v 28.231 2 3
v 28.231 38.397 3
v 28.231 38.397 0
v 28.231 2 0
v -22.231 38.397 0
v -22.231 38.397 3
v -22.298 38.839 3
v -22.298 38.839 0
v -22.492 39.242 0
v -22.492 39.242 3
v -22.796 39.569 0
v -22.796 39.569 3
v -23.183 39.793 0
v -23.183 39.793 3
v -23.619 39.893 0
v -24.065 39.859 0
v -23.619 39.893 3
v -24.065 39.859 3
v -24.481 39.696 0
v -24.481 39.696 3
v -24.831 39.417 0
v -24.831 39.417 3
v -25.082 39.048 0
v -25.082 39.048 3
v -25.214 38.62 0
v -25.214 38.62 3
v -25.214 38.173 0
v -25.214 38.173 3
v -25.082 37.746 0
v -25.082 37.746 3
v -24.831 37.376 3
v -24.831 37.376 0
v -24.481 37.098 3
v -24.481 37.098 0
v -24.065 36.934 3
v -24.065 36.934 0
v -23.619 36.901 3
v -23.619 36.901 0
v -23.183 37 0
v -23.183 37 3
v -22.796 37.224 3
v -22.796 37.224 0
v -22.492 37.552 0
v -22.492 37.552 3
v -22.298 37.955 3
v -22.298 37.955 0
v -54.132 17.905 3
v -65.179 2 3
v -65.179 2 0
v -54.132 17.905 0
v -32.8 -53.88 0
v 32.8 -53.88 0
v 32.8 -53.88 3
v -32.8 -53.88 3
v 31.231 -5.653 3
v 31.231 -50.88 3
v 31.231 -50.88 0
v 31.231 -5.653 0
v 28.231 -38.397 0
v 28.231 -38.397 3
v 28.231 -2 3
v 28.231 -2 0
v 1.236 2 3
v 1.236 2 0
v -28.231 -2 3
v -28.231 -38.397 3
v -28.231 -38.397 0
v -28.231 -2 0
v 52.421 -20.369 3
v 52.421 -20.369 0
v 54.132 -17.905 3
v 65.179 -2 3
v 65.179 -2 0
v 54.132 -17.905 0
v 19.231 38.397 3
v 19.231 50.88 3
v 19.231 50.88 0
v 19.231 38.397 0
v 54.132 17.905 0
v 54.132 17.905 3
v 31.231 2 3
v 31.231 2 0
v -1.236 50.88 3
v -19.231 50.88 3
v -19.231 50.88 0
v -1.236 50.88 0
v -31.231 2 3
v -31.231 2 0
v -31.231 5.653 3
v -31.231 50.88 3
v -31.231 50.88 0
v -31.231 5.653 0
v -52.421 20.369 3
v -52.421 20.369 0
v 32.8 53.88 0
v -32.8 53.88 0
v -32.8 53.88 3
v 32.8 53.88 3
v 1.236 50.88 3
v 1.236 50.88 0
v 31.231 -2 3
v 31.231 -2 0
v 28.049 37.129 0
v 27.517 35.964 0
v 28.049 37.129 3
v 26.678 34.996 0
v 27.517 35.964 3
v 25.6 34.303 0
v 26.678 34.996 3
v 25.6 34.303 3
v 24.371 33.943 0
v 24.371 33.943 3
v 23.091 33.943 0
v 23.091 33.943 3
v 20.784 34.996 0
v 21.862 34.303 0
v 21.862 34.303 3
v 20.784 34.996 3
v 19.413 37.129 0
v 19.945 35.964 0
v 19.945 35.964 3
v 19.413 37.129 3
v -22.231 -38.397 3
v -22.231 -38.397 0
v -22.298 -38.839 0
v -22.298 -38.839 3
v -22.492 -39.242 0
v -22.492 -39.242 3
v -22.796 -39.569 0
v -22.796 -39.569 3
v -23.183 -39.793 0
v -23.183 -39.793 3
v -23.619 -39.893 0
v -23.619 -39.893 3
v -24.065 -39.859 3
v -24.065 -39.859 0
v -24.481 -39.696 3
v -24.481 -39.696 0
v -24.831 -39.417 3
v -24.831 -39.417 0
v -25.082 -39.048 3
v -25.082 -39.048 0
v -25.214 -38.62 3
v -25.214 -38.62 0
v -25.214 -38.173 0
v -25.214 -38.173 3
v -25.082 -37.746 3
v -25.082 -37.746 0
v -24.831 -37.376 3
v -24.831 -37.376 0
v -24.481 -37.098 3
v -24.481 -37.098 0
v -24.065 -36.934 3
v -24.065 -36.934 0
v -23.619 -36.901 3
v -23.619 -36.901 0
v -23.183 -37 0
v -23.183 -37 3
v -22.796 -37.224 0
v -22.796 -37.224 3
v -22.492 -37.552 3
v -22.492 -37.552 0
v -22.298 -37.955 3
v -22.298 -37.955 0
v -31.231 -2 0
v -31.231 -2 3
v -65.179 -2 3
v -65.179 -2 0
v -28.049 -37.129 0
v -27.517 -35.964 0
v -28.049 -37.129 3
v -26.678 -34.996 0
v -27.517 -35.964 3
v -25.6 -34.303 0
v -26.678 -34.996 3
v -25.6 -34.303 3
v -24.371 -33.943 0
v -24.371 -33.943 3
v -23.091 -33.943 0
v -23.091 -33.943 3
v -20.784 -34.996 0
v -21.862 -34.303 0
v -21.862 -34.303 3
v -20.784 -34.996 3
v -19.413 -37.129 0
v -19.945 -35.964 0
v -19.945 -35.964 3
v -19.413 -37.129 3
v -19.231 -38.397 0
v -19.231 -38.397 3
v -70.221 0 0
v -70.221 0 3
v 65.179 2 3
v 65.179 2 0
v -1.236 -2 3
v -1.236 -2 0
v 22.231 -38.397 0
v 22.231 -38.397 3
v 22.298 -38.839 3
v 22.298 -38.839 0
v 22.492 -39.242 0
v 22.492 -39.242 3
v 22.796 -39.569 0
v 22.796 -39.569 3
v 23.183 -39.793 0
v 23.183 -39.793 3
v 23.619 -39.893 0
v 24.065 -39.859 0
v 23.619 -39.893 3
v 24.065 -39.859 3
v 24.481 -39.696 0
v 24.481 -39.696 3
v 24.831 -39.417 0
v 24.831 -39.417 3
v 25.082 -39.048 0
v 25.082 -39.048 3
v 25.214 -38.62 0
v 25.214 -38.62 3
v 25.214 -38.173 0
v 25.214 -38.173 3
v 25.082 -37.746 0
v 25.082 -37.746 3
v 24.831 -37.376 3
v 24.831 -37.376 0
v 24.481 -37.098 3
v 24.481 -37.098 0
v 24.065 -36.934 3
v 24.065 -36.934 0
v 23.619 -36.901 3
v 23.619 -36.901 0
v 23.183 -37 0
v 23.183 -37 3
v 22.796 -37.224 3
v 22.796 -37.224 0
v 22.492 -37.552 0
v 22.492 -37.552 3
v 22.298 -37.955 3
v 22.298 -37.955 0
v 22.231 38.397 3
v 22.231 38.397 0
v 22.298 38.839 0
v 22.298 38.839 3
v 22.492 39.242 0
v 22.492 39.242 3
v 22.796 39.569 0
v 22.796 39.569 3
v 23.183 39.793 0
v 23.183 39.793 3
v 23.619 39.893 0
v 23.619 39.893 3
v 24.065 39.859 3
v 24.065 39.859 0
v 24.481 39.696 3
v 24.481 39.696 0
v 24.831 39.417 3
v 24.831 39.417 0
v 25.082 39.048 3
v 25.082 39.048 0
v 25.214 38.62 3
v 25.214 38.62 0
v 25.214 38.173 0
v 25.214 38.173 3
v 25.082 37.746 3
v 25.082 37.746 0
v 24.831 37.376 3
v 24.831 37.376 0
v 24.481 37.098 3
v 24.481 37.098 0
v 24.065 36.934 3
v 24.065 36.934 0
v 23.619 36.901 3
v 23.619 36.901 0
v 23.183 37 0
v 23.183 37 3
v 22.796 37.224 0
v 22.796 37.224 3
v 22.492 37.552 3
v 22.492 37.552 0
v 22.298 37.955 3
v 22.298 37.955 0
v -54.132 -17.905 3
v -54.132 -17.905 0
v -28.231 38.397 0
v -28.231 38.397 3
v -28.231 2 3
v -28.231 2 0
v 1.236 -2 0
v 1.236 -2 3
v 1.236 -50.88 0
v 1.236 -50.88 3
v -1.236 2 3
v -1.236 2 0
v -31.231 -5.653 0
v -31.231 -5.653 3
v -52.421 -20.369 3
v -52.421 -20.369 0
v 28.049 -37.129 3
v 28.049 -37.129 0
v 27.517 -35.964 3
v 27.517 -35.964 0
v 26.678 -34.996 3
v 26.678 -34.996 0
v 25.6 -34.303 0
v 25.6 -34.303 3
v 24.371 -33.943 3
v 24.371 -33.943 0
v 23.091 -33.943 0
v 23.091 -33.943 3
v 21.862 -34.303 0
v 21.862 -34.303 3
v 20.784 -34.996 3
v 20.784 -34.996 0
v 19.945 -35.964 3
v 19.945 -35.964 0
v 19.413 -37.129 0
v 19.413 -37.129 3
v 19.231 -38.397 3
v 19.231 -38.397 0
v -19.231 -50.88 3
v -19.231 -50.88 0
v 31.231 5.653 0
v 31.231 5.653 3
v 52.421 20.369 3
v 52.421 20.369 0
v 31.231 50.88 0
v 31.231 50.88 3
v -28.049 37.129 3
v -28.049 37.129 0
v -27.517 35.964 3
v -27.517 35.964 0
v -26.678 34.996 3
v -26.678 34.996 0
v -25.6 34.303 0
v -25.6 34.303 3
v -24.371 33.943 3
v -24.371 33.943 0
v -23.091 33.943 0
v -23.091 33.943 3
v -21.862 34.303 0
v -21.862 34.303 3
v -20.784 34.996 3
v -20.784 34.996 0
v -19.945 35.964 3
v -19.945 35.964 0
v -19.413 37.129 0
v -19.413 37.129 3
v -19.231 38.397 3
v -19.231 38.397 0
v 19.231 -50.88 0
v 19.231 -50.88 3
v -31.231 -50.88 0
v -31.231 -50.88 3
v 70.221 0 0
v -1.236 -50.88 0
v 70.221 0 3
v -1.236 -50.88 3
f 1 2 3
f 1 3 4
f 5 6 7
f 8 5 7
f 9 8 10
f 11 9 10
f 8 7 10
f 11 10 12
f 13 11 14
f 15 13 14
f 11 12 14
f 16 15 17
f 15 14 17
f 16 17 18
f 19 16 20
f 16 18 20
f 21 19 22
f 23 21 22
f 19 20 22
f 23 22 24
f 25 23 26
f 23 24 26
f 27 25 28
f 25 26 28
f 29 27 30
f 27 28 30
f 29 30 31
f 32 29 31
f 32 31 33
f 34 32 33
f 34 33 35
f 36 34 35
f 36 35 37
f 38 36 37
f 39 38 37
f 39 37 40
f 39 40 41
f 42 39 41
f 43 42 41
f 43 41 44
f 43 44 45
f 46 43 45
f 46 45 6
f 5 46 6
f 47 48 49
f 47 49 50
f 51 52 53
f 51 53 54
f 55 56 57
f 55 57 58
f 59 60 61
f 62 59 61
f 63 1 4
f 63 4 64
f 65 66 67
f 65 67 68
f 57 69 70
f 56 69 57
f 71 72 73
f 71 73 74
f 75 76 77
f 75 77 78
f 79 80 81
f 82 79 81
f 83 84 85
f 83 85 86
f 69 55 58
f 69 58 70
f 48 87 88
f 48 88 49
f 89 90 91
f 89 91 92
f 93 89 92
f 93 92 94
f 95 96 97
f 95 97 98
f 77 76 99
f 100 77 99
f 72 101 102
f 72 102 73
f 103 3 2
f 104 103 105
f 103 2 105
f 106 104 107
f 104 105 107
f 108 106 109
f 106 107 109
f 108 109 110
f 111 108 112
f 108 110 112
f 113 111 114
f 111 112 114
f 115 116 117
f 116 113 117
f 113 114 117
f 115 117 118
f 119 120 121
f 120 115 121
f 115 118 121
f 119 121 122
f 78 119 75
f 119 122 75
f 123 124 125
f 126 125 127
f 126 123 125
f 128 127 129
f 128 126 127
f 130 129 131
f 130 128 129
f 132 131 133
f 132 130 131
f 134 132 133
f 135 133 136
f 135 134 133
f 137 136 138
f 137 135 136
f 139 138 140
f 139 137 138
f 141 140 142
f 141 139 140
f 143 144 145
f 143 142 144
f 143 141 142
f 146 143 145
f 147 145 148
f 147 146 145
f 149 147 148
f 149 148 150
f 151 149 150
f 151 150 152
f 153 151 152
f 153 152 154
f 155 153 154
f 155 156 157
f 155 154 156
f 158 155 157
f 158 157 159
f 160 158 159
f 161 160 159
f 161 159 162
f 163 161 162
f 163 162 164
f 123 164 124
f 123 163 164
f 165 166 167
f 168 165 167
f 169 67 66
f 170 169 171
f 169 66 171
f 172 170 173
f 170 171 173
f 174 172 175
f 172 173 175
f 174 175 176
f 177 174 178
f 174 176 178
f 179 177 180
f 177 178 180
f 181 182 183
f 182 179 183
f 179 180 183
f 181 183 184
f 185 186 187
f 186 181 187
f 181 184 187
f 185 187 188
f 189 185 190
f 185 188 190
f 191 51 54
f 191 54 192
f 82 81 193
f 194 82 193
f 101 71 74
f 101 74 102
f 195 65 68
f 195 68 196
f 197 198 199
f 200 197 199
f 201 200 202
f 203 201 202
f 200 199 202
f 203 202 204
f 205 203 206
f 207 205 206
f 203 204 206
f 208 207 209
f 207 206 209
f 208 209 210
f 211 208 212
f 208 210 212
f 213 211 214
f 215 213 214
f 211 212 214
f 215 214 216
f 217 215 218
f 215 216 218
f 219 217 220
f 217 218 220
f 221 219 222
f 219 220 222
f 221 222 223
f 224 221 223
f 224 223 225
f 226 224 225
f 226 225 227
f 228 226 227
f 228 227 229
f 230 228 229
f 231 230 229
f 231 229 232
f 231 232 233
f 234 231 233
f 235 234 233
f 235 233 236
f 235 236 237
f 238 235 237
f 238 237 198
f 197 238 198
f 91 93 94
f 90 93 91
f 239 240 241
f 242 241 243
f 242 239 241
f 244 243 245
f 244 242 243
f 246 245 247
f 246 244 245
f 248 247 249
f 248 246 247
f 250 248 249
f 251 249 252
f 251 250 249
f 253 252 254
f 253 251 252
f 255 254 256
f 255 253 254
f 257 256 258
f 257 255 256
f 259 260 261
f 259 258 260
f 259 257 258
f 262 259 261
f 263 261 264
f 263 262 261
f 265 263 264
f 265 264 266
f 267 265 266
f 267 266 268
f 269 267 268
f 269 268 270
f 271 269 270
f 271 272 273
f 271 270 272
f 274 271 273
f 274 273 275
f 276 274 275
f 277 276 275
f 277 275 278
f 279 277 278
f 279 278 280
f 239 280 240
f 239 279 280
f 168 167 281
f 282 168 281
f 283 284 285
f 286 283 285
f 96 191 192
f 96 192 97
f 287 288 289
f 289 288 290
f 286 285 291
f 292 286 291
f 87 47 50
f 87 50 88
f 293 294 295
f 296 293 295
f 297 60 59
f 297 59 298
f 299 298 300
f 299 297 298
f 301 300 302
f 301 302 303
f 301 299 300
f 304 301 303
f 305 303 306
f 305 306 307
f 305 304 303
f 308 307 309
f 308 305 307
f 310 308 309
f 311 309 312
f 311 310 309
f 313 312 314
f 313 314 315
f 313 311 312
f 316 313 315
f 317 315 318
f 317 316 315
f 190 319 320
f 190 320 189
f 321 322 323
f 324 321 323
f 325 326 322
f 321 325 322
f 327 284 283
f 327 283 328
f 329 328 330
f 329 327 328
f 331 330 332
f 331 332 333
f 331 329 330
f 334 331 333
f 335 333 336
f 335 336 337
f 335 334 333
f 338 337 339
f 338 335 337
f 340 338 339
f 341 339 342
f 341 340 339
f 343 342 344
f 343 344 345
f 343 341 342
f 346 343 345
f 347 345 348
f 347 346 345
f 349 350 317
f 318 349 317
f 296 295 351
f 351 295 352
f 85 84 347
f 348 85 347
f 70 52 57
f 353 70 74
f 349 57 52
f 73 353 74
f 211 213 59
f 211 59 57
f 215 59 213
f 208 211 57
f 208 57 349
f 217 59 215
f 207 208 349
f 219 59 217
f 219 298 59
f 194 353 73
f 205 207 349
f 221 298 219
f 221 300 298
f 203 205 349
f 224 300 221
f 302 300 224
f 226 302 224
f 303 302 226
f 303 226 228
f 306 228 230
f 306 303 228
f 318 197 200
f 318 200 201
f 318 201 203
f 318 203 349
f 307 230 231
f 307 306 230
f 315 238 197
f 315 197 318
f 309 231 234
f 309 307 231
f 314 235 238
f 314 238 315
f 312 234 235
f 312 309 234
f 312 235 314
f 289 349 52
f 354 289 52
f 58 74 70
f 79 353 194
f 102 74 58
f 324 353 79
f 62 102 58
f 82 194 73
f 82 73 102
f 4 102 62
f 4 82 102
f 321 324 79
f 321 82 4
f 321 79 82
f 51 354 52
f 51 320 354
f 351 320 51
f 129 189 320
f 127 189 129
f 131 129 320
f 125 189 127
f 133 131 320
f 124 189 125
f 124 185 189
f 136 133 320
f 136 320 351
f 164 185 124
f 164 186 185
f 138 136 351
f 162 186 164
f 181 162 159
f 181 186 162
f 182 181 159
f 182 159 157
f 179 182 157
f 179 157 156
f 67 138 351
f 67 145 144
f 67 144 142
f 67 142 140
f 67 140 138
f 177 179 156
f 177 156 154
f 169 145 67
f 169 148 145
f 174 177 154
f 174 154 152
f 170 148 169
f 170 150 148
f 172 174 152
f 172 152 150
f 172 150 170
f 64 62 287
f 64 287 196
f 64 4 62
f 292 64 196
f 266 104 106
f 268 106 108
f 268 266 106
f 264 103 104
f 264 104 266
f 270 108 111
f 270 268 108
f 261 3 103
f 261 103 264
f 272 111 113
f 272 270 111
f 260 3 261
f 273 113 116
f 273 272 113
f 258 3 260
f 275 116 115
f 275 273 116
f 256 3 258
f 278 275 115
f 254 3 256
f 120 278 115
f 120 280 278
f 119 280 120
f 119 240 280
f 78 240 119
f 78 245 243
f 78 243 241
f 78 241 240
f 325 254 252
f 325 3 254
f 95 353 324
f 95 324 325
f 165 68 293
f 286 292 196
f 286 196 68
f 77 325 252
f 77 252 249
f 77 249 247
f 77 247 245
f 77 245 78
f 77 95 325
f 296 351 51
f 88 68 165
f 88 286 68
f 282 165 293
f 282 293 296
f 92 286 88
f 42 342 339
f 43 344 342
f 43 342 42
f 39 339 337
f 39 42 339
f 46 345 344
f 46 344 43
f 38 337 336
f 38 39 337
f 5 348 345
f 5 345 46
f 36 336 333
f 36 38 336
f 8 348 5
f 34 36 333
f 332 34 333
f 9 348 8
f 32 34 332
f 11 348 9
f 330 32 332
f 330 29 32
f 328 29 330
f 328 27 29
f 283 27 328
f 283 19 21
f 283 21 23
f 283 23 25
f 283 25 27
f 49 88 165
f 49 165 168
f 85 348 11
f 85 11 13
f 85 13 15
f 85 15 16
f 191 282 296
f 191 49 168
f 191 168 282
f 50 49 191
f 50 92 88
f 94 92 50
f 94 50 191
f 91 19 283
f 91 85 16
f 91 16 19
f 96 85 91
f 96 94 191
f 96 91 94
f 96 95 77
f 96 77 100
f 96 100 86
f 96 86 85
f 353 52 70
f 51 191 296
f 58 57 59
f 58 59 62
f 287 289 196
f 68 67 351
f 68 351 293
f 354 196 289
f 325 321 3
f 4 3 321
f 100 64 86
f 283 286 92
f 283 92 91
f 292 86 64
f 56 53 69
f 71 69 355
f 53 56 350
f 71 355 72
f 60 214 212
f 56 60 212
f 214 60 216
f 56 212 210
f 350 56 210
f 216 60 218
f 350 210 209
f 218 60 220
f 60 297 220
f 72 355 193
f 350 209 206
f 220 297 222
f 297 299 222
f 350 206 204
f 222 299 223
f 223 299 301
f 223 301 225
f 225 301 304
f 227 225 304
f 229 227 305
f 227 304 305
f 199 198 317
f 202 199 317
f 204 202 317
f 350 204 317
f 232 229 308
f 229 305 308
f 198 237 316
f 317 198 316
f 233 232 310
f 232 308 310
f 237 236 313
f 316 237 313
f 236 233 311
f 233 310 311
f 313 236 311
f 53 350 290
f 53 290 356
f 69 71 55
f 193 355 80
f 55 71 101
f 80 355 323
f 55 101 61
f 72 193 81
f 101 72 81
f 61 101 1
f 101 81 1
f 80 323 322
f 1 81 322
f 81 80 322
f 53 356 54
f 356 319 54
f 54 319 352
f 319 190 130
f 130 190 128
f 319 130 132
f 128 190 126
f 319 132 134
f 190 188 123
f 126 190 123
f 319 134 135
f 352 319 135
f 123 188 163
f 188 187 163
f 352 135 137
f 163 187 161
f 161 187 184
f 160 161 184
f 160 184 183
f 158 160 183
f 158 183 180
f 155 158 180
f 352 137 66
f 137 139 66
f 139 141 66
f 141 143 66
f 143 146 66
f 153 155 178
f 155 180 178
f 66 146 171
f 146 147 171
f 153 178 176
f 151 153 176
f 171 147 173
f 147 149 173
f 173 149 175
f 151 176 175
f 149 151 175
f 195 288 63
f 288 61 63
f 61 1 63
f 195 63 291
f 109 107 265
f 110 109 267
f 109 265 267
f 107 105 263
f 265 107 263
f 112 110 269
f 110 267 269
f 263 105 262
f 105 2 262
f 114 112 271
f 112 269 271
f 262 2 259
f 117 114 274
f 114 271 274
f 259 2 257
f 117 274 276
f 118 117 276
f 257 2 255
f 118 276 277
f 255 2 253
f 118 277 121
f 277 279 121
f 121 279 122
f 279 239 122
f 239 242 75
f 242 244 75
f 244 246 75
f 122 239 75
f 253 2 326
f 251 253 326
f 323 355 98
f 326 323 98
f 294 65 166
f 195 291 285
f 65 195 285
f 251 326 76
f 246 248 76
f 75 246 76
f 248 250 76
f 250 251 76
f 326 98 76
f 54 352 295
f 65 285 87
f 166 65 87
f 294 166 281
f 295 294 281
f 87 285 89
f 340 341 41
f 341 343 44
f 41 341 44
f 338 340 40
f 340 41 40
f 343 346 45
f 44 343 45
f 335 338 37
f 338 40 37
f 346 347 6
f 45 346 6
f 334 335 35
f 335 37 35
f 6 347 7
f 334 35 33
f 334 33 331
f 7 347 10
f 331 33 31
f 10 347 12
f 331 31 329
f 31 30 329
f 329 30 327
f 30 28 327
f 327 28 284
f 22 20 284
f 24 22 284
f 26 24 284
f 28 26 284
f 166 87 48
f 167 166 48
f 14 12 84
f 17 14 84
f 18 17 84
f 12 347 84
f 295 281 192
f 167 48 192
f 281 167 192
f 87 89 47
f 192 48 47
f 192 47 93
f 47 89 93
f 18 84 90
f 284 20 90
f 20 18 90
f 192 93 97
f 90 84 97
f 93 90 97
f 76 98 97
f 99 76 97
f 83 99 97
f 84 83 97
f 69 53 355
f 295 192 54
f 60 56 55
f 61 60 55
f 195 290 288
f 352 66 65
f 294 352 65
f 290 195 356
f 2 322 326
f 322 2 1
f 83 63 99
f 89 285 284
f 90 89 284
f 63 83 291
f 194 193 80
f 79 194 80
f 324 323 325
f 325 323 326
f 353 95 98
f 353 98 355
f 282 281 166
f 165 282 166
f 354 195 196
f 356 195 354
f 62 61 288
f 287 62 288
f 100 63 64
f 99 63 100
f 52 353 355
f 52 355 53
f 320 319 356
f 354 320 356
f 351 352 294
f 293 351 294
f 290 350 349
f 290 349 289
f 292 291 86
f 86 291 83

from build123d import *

# Parameters (mm, degrees)
SKETCH001_R      = 1.5
EXTRUDE001_DEPTH = 10
EXTRUDE_DEPTH    = 3


with BuildPart() as extrude001:
    # Sketch001 (on Face8 of Extrude) → Extrude001 (new body)
    with BuildSketch(Plane.XY.offset(3)):
        with Locations((-23.730994, 38.396749)):
            Circle(SKETCH001_R)
        Polygon((-65.179059, 2), (-54.13242, 17.905464), (-31.230994, 2), align=None)
        Polygon((-31.230994, 5.652561), (-52.421109, 20.369488), (-31.230994, 50.88), align=None)
        with BuildLine():
            Line((-28.230994, 38.396749), (-28.230994, 2))
            Line((-28.230994, 2), (-1.236094, 2))
            Line((-1.236094, 2), (-1.236094, 50.88))
            Line((-19.230994, 50.88), (-1.236094, 50.88))
            Line((-19.230994, 50.88), (-19.230994, 38.396747))
            ThreePointArc((-28.230994, 38.396749), (-23.730995, 33.896749), (-19.230994, 38.396747))
        make_face()
    extrude(amount=-EXTRUDE001_DEPTH)


with BuildPart() as part_mirroring:
    # Part__Mirroring: instance of Extrude001
    add(extrude001.part.mirror(Plane(origin=(0, 0, 0), x_dir=(1, 0, 0), z_dir=(0, 1, 0))))


with BuildPart() as part_mirroring001:
    # Part__Mirroring001: instance of Part__Mirroring
    add(part_mirroring.part.mirror(Plane(origin=(0, 0, 0), x_dir=(0, -1, 0), z_dir=(1, 0, 0))))


with BuildPart() as part_mirroring002:
    # Part__Mirroring002: instance of Extrude001
    add(extrude001.part.mirror(Plane(origin=(0, 0, 0), x_dir=(0, -1, 0), z_dir=(1, 0, 0))))


with BuildPart() as cut003:
    # Sketch → Extrude (new body)
    with BuildSketch(Plane.XY):
        Polygon((-32.8, 53.88), (32.8, 53.88), (70.220657, 0), (32.8, -53.88), (-32.8, -53.88), (-70.220657, 0), align=None)
    extrude(amount=EXTRUDE_DEPTH)

    # Cut: cut Part__Mirroring002
    add(part_mirroring002.part, mode=Mode.SUBTRACT)

    # Cut001: cut Extrude001
    add(extrude001.part, mode=Mode.SUBTRACT)

    # Cut002: cut Part__Mirroring001
    add(part_mirroring001.part, mode=Mode.SUBTRACT)

    # Cut003: cut Part__Mirroring
    add(part_mirroring.part, mode=Mode.SUBTRACT)


solid = cut003.part
